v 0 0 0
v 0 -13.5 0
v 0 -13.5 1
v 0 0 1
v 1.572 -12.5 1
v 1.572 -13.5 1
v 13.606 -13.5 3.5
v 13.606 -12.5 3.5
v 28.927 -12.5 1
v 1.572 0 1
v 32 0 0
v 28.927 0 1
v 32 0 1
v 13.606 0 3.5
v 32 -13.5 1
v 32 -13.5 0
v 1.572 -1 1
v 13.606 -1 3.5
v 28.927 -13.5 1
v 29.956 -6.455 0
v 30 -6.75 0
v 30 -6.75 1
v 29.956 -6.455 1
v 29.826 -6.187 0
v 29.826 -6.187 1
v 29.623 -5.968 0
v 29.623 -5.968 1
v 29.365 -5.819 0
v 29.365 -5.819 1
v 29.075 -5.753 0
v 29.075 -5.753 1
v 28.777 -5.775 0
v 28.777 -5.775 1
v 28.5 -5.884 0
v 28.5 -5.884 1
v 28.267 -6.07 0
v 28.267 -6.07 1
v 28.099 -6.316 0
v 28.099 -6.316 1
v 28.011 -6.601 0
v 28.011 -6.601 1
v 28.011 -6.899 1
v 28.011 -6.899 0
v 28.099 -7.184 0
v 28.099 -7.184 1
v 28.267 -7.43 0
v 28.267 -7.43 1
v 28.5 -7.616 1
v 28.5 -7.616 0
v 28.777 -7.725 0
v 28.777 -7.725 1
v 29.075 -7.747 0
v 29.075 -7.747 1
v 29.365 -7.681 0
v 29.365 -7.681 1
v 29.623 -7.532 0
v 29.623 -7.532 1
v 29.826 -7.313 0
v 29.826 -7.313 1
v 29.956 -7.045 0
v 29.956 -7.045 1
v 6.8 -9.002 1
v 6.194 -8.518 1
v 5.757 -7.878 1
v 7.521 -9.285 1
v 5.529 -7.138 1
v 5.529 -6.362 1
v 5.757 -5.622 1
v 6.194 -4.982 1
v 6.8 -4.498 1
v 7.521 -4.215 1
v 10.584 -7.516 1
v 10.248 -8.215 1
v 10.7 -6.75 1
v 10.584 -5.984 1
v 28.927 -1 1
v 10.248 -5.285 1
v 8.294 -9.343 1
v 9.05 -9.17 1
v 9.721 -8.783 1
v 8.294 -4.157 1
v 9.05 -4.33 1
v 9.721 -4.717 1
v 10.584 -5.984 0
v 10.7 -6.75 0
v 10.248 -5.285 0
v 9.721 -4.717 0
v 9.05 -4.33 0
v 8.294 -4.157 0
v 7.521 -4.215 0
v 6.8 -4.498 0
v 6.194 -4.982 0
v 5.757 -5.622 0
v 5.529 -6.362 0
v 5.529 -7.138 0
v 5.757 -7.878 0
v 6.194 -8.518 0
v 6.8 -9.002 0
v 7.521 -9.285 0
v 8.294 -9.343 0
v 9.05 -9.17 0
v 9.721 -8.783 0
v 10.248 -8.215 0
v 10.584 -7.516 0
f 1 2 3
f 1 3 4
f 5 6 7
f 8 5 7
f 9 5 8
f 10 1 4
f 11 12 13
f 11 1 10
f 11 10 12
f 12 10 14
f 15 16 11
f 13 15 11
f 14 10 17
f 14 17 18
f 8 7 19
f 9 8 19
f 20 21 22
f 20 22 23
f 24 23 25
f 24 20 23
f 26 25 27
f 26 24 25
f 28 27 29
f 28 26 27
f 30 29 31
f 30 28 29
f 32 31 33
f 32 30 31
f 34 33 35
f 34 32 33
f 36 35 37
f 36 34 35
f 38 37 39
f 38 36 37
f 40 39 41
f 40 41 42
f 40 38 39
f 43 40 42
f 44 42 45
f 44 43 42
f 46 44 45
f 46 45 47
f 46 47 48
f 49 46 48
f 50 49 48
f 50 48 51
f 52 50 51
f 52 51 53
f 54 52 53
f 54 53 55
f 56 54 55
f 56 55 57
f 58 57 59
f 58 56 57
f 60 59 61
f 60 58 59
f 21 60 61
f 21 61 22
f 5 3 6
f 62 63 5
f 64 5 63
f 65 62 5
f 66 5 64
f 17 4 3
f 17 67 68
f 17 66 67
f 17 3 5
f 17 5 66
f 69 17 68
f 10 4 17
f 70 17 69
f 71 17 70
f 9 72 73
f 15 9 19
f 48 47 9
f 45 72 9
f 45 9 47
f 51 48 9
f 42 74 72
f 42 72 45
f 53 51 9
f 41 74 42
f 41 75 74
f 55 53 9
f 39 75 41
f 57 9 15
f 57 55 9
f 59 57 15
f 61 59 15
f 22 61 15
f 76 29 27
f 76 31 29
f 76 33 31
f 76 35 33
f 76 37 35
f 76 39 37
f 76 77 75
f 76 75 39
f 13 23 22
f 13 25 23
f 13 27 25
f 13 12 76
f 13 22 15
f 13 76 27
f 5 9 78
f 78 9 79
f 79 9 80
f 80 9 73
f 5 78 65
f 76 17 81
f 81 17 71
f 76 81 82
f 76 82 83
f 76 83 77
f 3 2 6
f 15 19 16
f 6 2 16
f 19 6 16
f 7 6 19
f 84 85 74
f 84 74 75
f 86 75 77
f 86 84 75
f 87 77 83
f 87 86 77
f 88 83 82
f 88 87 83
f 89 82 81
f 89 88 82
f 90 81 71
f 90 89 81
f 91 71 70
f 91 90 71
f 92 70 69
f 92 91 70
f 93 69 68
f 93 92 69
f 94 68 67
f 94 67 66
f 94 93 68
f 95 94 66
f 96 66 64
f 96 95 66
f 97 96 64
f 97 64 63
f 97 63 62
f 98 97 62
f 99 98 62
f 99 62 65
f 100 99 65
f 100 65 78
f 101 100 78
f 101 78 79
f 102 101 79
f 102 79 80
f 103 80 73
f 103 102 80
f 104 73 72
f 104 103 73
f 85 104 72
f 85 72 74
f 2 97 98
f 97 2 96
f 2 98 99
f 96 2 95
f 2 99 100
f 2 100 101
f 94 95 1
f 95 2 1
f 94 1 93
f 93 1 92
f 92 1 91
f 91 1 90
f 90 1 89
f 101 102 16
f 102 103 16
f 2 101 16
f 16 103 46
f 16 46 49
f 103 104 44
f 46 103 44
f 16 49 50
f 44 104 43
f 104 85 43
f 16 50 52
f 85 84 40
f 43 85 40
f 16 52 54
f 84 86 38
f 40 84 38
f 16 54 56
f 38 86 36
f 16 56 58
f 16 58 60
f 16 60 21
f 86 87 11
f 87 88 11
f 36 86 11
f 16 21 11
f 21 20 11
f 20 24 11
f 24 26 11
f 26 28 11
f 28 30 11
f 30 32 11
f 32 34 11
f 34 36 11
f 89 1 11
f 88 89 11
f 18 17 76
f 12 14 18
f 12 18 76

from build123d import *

# Parameters (mm, degrees)
CROQUIS1_W              = 32
CROQUIS1_H              = 13.5
CROQUIS1_R              = 2.6
CROQUIS1_R_2            = 1
SALIENTE_EXTRUIR1_DEPTH = 1
SALIENTE_EXTRUIR2_DEPTH = 1


with BuildPart() as part:
    # Croquis1 → Saliente-Extruir1 (new body)
    with BuildSketch(Plane.XY):
        with Locations((16, -6.75)):
            Rectangle(CROQUIS1_W, CROQUIS1_H)
        with Locations((8.1, -6.75)):
            Circle(CROQUIS1_R, mode=Mode.SUBTRACT)
        with Locations((29, -6.75)):
            Circle(CROQUIS1_R_2, mode=Mode.SUBTRACT)
    extrude(amount=SALIENTE_EXTRUIR1_DEPTH)

    # Croquis2 → Saliente-Extruir2 (add)
    with BuildSketch(Plane(origin=(0, 0, 0), x_dir=(1, 0, 0), z_dir=(0, 1, 0))):
        Polygon((1.571524395, -1), (13.606050016, -3.5), (28.926741078, -1), align=None)
    saliente_extruir2 = extrude(amount=-SALIENTE_EXTRUIR2_DEPTH)

    # Simetría1: Saliente-Extruir2 across plane
    add(saliente_extruir2.mirror(Plane.ZX.offset(-6.75)))


solid = part.part
